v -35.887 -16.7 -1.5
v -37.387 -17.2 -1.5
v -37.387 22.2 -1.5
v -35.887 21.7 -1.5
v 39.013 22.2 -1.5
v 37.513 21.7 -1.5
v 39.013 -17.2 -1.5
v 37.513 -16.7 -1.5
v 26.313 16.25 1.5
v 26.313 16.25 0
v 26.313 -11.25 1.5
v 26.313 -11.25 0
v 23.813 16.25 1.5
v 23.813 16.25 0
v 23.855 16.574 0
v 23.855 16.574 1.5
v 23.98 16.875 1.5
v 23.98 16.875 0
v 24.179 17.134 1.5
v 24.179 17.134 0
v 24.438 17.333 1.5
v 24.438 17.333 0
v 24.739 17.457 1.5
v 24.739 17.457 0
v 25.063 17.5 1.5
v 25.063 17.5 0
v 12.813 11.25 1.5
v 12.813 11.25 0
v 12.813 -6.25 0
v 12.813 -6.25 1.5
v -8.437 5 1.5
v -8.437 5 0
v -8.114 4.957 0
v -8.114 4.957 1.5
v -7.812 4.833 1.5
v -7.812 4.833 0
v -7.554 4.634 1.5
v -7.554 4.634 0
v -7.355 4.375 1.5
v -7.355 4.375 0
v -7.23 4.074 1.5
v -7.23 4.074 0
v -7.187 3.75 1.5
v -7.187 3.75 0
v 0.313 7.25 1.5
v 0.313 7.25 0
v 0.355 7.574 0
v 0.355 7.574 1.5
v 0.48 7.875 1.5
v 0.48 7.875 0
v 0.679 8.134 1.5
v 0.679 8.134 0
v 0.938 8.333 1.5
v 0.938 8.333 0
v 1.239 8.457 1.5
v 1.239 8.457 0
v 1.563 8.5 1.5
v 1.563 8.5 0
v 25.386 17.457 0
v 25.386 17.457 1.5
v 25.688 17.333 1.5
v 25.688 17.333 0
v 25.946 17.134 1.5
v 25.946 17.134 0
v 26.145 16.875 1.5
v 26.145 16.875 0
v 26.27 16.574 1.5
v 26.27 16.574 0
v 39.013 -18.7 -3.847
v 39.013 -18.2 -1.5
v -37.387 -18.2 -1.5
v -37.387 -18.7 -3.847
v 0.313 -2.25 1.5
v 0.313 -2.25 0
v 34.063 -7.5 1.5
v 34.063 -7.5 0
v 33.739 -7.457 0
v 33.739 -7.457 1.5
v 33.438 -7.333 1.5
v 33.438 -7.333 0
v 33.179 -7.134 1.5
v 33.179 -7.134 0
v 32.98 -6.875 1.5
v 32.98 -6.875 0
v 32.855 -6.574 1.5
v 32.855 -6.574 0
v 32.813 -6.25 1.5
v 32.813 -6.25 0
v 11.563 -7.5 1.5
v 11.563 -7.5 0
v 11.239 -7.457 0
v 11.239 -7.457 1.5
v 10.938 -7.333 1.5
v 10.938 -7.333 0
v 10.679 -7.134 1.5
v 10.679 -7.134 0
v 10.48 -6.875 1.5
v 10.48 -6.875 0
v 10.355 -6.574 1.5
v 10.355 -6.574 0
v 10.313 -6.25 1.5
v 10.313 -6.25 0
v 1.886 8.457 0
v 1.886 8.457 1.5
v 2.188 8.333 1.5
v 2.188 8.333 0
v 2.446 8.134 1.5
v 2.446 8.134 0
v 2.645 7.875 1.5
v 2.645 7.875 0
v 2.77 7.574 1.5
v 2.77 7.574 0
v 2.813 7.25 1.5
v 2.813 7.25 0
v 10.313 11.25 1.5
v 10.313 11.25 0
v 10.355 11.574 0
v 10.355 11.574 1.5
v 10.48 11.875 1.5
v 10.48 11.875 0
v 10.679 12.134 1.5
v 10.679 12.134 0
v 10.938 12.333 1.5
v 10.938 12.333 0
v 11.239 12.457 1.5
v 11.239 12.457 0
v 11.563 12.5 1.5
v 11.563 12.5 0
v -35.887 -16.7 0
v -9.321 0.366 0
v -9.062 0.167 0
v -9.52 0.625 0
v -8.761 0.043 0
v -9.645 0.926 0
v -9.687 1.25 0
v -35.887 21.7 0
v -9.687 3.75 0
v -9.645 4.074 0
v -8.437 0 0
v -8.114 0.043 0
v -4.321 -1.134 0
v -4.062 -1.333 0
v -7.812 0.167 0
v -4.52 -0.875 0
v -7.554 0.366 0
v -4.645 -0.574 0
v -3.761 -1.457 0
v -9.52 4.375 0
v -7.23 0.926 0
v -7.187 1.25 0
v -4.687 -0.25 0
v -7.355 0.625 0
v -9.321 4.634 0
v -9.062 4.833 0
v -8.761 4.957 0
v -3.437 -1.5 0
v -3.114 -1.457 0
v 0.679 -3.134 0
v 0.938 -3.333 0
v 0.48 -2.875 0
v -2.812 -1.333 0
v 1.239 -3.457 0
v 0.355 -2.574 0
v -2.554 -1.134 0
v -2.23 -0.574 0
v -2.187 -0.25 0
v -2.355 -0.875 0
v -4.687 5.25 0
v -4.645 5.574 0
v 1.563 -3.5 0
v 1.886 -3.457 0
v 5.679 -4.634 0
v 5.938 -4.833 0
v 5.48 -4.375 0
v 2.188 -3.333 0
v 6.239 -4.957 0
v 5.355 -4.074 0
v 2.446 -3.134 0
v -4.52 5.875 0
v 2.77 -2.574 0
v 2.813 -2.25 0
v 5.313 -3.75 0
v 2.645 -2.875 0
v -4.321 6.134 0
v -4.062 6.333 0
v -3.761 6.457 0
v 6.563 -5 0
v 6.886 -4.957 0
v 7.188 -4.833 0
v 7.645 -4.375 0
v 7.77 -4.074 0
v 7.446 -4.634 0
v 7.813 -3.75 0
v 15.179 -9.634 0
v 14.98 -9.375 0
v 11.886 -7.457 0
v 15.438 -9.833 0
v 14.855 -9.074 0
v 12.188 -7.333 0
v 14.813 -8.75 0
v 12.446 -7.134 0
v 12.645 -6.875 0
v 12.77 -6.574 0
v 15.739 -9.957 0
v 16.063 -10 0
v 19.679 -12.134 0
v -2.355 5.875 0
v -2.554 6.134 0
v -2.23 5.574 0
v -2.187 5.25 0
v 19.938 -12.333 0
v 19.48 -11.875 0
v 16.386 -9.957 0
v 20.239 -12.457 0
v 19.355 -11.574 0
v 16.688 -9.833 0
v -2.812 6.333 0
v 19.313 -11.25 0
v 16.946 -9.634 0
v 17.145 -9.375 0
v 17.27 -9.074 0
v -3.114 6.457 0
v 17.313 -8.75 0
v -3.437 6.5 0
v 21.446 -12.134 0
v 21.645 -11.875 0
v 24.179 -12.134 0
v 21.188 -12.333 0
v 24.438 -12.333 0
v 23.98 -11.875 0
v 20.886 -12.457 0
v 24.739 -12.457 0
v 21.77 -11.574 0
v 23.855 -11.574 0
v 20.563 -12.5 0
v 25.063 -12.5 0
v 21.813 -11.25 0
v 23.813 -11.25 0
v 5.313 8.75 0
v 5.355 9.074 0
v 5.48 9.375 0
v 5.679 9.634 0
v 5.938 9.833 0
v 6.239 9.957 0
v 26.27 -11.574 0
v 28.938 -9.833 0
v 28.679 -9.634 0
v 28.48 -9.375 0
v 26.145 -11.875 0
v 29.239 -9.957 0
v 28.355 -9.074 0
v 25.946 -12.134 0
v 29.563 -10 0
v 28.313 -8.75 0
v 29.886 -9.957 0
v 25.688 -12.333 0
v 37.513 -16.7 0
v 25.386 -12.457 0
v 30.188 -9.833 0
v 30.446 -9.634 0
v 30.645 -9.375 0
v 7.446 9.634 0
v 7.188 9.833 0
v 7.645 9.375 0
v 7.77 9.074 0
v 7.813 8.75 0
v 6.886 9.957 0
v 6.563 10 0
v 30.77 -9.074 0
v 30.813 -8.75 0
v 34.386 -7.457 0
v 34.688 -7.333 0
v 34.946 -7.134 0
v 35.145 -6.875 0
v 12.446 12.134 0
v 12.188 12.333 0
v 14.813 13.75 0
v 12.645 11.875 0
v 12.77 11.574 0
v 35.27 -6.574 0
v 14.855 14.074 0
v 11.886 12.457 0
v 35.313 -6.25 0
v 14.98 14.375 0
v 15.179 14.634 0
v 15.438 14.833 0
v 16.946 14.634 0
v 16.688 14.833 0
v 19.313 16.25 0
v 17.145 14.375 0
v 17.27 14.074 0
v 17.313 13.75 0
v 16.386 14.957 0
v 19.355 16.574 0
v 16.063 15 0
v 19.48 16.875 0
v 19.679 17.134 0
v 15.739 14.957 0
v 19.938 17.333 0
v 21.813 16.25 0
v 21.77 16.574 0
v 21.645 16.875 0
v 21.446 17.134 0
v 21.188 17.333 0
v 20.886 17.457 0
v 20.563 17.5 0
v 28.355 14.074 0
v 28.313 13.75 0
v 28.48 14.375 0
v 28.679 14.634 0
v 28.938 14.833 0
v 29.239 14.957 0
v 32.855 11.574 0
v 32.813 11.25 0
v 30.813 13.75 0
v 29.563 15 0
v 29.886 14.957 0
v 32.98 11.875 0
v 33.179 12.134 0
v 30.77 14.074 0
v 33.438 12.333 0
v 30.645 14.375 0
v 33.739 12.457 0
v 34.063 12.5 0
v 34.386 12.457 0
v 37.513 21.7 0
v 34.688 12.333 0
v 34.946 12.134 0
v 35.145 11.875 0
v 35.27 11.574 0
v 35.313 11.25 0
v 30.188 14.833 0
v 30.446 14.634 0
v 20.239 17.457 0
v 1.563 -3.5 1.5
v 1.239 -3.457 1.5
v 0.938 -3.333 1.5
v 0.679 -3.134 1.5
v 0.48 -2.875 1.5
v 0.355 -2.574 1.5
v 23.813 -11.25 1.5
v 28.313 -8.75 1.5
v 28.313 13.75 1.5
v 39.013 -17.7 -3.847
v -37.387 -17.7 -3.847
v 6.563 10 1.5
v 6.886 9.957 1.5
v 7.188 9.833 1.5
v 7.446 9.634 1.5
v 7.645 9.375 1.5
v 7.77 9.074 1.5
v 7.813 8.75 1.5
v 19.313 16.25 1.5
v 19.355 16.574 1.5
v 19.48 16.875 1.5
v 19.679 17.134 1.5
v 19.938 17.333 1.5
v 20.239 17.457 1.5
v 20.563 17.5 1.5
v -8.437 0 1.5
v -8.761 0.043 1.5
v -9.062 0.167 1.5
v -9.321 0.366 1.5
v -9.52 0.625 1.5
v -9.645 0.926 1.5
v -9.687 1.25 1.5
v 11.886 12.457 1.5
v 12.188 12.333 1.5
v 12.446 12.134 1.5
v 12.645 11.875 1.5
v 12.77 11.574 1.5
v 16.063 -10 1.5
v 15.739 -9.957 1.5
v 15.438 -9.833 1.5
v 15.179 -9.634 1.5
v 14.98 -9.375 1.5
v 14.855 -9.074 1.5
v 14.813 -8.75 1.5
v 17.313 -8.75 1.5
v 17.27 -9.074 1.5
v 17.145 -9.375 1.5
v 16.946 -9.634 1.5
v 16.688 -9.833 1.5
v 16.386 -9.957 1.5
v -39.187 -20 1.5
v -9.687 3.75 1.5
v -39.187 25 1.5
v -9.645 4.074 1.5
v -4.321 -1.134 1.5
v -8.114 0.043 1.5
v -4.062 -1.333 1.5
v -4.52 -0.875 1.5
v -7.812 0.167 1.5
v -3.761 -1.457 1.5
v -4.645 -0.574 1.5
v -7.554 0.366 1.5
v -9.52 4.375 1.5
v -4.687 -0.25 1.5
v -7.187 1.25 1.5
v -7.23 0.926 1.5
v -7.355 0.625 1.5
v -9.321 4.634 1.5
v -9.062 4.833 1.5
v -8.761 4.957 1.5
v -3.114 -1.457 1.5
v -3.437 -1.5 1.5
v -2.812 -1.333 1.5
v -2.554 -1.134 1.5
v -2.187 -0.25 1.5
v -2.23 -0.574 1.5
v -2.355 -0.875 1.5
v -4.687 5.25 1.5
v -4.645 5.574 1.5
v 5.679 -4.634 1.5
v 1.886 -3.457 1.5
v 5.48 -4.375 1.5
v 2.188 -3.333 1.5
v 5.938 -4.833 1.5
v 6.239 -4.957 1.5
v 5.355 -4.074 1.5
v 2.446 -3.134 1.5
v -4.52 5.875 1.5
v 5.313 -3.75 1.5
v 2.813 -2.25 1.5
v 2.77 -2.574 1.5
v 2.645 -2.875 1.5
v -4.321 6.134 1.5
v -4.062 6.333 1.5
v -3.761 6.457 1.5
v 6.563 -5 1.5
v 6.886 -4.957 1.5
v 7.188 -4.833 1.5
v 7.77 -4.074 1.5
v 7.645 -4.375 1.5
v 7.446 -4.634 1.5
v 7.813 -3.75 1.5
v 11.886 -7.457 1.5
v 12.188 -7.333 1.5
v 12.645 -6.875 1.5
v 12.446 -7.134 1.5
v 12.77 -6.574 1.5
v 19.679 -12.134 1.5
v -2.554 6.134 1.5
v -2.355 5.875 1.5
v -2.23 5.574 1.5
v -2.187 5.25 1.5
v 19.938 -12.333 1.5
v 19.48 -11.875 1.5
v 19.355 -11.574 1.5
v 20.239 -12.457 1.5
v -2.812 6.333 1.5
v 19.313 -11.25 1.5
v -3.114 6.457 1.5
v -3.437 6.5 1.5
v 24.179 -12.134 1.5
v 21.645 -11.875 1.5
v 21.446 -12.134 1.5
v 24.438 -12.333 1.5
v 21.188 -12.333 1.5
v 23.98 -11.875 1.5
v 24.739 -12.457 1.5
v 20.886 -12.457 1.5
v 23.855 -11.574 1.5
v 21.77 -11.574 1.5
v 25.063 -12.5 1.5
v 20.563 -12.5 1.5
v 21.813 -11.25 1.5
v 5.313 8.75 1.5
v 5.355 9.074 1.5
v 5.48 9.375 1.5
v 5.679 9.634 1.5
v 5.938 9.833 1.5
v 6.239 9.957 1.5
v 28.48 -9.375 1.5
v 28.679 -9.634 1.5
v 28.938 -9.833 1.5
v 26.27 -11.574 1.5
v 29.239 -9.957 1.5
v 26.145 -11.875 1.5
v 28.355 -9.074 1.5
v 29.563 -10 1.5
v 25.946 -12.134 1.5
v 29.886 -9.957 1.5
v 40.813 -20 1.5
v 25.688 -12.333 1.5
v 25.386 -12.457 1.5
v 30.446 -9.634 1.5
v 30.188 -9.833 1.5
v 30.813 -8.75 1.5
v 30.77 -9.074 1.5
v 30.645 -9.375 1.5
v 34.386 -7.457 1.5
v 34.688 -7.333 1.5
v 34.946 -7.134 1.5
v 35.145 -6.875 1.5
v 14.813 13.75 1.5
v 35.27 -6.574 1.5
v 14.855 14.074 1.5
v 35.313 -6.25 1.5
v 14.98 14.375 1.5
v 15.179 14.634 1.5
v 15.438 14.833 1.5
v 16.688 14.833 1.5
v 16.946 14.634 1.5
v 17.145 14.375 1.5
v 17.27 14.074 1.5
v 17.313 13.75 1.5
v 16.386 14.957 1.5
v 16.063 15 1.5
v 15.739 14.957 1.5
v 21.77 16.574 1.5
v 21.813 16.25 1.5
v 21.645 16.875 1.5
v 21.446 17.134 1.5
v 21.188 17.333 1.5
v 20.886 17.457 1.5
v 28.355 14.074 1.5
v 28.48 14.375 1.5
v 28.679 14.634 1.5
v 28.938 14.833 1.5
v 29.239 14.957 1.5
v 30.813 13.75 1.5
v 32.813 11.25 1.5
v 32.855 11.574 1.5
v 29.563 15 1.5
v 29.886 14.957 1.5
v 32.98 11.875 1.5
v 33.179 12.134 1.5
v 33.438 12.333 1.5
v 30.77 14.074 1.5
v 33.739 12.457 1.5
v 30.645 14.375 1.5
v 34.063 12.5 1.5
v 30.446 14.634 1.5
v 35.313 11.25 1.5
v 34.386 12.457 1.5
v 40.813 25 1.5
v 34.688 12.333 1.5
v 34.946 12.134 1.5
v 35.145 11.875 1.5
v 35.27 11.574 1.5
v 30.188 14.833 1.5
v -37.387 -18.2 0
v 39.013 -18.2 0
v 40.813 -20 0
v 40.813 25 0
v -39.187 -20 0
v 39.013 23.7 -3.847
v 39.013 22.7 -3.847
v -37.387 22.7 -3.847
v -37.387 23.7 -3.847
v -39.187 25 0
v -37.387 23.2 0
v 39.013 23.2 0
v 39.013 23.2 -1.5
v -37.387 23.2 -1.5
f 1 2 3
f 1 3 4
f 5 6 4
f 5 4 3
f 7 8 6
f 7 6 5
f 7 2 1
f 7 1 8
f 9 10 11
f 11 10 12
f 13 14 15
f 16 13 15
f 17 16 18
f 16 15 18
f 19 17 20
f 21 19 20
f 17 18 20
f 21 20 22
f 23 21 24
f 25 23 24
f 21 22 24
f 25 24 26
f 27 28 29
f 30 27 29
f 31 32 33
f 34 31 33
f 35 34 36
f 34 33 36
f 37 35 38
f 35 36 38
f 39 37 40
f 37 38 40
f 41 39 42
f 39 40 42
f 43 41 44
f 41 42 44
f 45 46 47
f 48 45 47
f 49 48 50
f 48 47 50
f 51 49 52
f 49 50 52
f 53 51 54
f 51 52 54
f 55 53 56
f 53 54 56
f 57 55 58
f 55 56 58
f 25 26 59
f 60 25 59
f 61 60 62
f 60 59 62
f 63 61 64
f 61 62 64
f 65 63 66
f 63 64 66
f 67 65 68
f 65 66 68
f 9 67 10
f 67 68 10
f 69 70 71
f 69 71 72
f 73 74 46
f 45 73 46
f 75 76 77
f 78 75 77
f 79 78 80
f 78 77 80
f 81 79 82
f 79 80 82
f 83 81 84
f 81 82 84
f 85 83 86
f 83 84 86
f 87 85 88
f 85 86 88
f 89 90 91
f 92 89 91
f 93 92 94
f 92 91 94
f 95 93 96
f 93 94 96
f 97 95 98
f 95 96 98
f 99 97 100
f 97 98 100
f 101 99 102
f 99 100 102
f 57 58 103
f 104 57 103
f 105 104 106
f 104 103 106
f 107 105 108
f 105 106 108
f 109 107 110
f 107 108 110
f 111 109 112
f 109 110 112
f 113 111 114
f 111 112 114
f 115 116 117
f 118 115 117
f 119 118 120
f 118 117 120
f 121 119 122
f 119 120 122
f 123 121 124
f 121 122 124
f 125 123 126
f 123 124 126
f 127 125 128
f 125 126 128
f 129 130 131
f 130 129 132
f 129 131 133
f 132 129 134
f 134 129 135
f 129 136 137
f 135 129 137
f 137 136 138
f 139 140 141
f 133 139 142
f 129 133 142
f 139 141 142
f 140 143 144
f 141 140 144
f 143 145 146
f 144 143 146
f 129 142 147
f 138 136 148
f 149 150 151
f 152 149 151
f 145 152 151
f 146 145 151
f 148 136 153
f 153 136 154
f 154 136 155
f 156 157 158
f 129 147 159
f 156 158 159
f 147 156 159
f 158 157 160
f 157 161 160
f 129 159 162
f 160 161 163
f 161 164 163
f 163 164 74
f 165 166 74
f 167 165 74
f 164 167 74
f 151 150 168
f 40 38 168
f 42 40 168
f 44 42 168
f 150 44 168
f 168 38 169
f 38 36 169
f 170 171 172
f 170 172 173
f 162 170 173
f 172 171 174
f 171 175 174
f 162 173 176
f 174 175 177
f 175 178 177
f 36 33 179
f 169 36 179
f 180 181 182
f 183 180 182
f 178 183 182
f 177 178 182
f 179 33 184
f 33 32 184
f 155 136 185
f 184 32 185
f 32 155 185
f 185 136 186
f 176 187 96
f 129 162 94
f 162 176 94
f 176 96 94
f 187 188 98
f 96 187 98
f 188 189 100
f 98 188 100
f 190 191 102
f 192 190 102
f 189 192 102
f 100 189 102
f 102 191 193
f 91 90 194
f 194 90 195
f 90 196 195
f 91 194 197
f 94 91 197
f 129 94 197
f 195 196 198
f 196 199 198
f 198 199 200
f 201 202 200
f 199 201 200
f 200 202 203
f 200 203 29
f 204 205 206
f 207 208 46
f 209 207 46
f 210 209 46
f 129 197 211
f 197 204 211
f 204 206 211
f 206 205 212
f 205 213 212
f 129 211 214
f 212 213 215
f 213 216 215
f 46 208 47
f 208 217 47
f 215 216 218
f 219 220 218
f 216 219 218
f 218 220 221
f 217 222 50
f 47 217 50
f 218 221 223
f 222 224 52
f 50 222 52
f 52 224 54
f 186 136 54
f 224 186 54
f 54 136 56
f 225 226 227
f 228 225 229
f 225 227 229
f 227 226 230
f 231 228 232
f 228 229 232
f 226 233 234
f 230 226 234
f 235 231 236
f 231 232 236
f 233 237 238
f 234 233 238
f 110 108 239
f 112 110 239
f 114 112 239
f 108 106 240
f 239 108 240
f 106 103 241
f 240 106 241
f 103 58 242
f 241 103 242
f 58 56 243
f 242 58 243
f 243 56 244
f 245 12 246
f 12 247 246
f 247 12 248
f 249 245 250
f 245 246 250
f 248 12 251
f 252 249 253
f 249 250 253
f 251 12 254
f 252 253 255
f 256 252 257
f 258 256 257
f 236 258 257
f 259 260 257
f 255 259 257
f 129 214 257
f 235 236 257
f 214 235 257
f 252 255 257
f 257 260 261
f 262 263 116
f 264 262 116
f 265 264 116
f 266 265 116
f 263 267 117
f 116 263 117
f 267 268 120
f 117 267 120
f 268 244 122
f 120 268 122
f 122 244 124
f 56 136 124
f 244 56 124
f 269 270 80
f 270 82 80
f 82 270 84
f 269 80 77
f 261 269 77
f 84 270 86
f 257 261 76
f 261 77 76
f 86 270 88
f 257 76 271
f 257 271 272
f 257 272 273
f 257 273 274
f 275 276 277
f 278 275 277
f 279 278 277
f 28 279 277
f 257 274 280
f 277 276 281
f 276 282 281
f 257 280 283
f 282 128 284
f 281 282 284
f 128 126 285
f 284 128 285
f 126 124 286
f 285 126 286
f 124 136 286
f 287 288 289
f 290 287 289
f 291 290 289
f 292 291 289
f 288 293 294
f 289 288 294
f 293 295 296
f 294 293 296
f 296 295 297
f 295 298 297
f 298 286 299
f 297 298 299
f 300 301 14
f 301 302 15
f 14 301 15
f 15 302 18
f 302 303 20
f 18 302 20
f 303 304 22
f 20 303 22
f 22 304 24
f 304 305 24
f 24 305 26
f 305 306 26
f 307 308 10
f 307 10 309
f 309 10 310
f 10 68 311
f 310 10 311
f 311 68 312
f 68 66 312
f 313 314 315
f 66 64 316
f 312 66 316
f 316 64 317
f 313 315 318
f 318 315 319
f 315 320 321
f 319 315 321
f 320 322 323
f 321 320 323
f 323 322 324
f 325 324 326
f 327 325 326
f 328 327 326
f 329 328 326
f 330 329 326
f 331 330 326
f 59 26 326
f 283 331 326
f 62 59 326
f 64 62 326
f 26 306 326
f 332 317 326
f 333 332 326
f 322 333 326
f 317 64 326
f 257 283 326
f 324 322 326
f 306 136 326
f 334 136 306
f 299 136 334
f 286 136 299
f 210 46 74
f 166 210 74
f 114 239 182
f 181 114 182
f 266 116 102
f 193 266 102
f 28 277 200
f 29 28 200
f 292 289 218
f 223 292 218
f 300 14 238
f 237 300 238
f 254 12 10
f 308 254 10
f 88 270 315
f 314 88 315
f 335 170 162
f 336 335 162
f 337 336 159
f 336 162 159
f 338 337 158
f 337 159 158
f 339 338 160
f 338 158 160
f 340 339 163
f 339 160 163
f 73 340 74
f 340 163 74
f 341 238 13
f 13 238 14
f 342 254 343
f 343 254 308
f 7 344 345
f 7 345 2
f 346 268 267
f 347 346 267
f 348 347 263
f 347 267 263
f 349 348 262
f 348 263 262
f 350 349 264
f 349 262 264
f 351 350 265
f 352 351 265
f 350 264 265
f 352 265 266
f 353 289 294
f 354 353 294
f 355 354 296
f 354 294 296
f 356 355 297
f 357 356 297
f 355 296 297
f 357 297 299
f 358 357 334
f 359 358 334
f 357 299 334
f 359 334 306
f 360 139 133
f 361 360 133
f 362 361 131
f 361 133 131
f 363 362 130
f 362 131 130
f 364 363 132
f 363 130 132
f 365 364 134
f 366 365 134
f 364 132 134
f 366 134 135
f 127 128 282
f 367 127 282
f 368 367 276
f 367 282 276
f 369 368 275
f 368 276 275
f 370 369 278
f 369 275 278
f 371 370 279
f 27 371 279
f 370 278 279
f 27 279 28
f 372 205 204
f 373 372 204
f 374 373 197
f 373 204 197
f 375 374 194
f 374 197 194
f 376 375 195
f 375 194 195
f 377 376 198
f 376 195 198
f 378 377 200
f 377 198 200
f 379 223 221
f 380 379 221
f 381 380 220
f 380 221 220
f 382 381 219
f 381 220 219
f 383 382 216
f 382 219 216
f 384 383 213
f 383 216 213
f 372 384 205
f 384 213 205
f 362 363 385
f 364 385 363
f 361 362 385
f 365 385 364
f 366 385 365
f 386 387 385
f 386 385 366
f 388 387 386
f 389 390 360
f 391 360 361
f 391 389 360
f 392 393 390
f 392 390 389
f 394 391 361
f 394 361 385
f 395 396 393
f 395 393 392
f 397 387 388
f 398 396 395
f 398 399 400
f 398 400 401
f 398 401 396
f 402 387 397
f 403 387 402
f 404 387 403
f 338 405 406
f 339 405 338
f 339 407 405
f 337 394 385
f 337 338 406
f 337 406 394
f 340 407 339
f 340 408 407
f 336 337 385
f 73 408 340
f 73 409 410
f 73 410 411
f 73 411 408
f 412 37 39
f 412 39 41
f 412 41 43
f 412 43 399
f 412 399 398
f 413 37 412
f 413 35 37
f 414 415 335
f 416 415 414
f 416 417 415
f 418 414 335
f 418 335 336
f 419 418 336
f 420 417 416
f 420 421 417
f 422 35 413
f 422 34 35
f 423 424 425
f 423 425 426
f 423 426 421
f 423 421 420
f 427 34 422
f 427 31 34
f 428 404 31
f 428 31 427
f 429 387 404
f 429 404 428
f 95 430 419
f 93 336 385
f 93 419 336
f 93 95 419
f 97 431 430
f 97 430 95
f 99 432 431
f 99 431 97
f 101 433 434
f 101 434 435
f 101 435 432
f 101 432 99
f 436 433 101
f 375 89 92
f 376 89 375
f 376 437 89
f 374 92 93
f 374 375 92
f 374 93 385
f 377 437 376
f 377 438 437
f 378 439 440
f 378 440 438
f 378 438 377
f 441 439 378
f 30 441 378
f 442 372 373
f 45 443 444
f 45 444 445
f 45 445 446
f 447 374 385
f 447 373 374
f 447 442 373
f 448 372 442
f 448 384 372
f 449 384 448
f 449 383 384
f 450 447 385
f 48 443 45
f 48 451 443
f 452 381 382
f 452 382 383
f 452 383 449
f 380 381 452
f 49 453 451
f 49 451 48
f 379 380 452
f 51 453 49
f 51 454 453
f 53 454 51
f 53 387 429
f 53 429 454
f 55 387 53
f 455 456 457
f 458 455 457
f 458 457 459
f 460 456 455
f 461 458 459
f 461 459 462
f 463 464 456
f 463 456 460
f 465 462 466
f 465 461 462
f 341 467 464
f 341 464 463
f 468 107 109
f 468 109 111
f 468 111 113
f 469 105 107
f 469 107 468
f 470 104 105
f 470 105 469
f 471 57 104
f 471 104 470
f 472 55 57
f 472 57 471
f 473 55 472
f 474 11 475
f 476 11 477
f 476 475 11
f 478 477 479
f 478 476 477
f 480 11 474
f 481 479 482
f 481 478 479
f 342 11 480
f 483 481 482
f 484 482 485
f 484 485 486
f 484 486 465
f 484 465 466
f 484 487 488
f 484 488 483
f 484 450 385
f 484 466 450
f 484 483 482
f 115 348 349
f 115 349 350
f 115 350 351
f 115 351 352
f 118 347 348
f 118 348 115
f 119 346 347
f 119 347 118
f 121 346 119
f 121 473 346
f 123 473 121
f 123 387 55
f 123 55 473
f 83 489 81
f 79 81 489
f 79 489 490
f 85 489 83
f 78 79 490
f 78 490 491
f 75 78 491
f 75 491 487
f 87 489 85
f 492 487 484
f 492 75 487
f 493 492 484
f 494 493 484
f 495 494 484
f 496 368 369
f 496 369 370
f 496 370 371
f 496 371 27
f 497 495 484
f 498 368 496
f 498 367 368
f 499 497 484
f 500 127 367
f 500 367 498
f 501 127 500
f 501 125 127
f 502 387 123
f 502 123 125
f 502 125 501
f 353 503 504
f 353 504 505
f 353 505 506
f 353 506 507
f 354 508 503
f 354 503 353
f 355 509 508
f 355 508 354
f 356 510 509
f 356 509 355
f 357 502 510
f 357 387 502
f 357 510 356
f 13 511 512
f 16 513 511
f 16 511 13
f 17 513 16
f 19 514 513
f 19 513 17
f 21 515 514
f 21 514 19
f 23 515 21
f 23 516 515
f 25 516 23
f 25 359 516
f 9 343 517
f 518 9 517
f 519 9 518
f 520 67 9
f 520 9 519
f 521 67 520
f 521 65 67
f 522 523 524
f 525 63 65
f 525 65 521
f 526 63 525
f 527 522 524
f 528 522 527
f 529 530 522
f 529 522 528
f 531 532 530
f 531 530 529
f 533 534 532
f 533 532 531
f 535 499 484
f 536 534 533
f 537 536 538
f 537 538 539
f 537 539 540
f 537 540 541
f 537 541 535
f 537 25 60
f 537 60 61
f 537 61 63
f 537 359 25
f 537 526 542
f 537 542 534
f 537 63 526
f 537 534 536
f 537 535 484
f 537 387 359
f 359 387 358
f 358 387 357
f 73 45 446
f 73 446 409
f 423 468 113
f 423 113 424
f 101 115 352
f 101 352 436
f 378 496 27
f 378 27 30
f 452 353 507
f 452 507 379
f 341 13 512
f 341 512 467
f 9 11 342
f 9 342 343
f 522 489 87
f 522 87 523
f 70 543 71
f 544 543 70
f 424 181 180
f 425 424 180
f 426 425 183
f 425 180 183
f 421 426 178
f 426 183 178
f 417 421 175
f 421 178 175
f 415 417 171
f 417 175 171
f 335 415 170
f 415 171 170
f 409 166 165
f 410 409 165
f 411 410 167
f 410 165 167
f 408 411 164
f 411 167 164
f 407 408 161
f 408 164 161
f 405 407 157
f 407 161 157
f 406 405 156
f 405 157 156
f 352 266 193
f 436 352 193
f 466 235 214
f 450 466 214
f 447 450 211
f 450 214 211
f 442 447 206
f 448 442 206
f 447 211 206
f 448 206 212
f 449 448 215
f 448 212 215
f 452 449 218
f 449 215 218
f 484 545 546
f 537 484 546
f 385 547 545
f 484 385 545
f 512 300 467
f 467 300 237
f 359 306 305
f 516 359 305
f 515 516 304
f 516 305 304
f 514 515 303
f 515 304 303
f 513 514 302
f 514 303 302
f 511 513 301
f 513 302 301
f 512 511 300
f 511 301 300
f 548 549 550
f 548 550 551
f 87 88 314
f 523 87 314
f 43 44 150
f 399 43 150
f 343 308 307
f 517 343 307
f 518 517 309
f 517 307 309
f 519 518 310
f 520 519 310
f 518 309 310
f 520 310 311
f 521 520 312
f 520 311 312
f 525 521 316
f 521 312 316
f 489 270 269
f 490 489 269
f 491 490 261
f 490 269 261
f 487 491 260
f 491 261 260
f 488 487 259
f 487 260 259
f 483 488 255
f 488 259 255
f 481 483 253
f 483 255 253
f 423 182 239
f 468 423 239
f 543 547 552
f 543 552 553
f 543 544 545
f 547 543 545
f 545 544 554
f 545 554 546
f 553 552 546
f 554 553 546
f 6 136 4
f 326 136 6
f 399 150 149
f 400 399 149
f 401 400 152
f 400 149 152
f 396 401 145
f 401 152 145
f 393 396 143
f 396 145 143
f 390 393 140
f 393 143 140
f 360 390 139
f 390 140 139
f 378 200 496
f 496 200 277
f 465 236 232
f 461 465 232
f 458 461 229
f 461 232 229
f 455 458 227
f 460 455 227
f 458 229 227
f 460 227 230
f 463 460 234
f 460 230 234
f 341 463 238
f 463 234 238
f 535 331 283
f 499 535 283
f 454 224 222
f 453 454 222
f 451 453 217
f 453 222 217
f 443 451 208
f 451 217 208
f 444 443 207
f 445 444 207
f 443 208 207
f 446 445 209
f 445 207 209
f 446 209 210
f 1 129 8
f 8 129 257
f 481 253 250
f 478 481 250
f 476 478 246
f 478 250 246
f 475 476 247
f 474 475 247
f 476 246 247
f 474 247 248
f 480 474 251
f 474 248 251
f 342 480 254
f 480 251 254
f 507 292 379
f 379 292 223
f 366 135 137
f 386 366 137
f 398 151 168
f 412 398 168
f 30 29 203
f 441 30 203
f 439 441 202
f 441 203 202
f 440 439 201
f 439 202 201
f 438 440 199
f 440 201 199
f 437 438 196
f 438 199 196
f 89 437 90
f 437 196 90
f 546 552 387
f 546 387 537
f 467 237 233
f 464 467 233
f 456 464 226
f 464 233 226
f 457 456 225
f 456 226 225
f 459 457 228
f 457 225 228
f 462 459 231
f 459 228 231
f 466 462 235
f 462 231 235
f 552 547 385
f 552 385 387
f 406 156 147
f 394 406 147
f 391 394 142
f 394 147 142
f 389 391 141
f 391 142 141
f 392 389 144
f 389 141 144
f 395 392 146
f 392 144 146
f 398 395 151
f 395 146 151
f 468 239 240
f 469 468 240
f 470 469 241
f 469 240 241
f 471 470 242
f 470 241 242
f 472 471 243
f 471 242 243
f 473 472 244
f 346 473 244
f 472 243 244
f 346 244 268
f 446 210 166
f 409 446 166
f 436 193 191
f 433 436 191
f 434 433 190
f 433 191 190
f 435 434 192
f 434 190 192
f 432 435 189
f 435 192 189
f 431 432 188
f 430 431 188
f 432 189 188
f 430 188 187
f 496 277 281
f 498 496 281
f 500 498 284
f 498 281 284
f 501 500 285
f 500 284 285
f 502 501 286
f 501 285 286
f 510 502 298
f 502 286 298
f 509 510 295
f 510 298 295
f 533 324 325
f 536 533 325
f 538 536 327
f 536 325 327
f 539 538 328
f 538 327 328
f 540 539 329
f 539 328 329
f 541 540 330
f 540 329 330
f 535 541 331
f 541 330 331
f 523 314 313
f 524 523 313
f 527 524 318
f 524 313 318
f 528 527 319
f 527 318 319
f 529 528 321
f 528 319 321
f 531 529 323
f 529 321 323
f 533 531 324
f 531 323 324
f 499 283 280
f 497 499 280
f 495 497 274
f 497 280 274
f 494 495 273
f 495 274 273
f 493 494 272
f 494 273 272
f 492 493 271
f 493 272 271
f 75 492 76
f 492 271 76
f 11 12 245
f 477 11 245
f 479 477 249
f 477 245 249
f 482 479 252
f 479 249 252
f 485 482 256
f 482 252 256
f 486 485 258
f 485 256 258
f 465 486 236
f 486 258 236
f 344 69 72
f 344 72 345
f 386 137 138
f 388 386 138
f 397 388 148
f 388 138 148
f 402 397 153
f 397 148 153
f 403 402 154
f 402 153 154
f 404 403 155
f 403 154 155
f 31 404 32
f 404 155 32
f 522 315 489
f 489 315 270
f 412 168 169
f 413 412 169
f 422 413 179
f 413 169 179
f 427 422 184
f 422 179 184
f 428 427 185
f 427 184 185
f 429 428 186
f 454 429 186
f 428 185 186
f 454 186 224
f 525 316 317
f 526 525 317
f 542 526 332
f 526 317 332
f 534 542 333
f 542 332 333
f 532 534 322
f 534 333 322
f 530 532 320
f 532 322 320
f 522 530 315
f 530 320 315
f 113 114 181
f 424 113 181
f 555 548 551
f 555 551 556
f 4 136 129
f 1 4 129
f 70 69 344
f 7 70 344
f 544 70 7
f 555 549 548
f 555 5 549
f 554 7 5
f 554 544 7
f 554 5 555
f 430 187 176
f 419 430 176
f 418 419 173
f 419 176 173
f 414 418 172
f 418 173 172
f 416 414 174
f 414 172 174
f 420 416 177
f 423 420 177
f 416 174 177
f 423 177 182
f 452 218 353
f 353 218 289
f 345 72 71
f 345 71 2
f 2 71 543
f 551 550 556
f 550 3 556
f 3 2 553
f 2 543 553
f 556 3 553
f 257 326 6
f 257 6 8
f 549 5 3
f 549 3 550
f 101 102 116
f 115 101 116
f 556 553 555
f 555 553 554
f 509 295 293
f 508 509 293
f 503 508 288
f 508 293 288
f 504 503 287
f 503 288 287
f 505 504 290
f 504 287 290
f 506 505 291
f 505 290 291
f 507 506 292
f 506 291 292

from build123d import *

# Parameters (mm, degrees)
F0_W     = 80
F0_H     = 45
F1_DEPTH = 1.5
F2_W     = 76.4
F2_H     = 41.4
F2_W_2   = 73.4
F2_H_2   = 38.4
F3_DEPTH = 1.5
F5_DEPTH = 76.4
F6_DEPTH = 76.4


with BuildPart() as f1:
    # F0 (on Top) → F1 (new body)
    with BuildSketch(Plane.XY):
        with Locations((0.812615, 2.5)):
            Rectangle(F0_W, F0_H)
        with BuildLine():
            ThreePointArc((-8.437385, 0), (-9.321268, 0.366117), (-9.687385, 1.25))
            Line((-9.687385, 1.25), (-9.687385, 3.75))
            ThreePointArc((-9.687385, 3.75), (-9.321268, 4.633883), (-8.437385, 5))
            ThreePointArc((-8.437385, 5), (-7.553501, 4.633883), (-7.187385, 3.75))
            Line((-7.187385, 3.75), (-7.187385, 1.25))
            ThreePointArc((-7.187385, 1.25), (-7.553501, 0.366117), (-8.437385, 0))
        make_face(mode=Mode.SUBTRACT)
        with BuildLine():
            ThreePointArc((-3.437385, -1.5), (-4.321268, -1.133883), (-4.687385, -0.25))
            Line((-4.687385, -0.25), (-4.687385, 5.25))
            ThreePointArc((-4.687385, 5.25), (-4.321268, 6.133883), (-3.437385, 6.5))
            ThreePointArc((-3.437385, 6.5), (-2.553501, 6.133883), (-2.187385, 5.25))
            Line((-2.187385, 5.25), (-2.187385, -0.25))
            ThreePointArc((-2.187385, -0.25), (-2.553501, -1.133883), (-3.437385, -1.5))
        make_face(mode=Mode.SUBTRACT)
        with BuildLine():
            ThreePointArc((1.562615, -3.5), (0.678732, -3.133883), (0.312615, -2.25))
            Line((0.312615, -2.25), (0.312615, 7.25))
            ThreePointArc((0.312615, 7.25), (0.678732, 8.133883), (1.562615, 8.5))
            ThreePointArc((1.562615, 8.5), (2.446499, 8.133883), (2.812615, 7.25))
            Line((2.812615, 7.25), (2.812615, -2.25))
            ThreePointArc((2.812615, -2.25), (2.446499, -3.133883), (1.562615, -3.5))
        make_face(mode=Mode.SUBTRACT)
        with BuildLine():
            ThreePointArc((6.562615, -5), (5.678732, -4.633883), (5.312615, -3.75))
            Line((5.312615, -3.75), (5.312615, 8.75))
            ThreePointArc((5.312615, 8.75), (5.678732, 9.633883), (6.562615, 10))
            ThreePointArc((6.562615, 10), (7.446499, 9.633883), (7.812615, 8.75))
            Line((7.812615, 8.75), (7.812615, -3.75))
            ThreePointArc((7.812615, -3.75), (7.446499, -4.633883), (6.562615, -5))
        make_face(mode=Mode.SUBTRACT)
        with BuildLine():
            Line((10.312615, -6.25), (10.312615, 11.25))
            ThreePointArc((10.312615, 11.25), (10.678732, 12.133883), (11.562615, 12.5))
            ThreePointArc((11.562615, 12.5), (12.446499, 12.133883), (12.812615, 11.25))
            Line((12.812615, 11.25), (12.812615, -6.25))
            ThreePointArc((12.812615, -6.25), (12.446499, -7.133883), (11.562615, -7.5))
            ThreePointArc((11.562615, -7.5), (10.678732, -7.133883), (10.312615, -6.25))
        make_face(mode=Mode.SUBTRACT)
        with BuildLine():
            Line((14.812615, -8.75), (14.812615, 13.75))
            ThreePointArc((14.812615, 13.75), (15.178732, 14.633883), (16.062615, 15))
            ThreePointArc((16.062615, 15), (16.946499, 14.633883), (17.312615, 13.75))
            Line((17.312615, 13.75), (17.312615, -8.75))
            ThreePointArc((17.312615, -8.75), (16.946499, -9.633883), (16.062615, -10))
            ThreePointArc((16.062615, -10), (15.178732, -9.633883), (14.812615, -8.75))
        make_face(mode=Mode.SUBTRACT)
        with BuildLine():
            Line((19.312615, -11.25), (19.312615, 16.25))
            ThreePointArc((19.312615, 16.25), (19.678732, 17.133883), (20.562615, 17.5))
            ThreePointArc((20.562615, 17.5), (21.446499, 17.133883), (21.812615, 16.25))
            Line((21.812615, 16.25), (21.812615, -11.25))
            ThreePointArc((21.812615, -11.25), (21.446499, -12.133883), (20.562615, -12.5))
            ThreePointArc((20.562615, -12.5), (19.678732, -12.133883), (19.312615, -11.25))
        make_face(mode=Mode.SUBTRACT)
        with BuildLine():
            Line((23.812615, -11.25), (23.812615, 16.25))
            ThreePointArc((23.812615, 16.25), (24.178732, 17.133883), (25.062615, 17.5))
            ThreePointArc((25.062615, 17.5), (25.946499, 17.133883), (26.312615, 16.25))
            Line((26.312615, 16.25), (26.312615, -11.25))
            ThreePointArc((26.312615, -11.25), (25.946499, -12.133883), (25.062615, -12.5))
            ThreePointArc((25.062615, -12.5), (24.178732, -12.133883), (23.812615, -11.25))
        make_face(mode=Mode.SUBTRACT)
        with BuildLine():
            Line((28.312615, -8.75), (28.312615, 13.75))
            ThreePointArc((28.312615, 13.75), (28.678732, 14.633883), (29.562615, 15))
            ThreePointArc((29.562615, 15), (30.446499, 14.633883), (30.812615, 13.75))
            Line((30.812615, 13.75), (30.812615, -8.75))
            ThreePointArc((30.812615, -8.75), (30.446499, -9.633883), (29.562615, -10))
            ThreePointArc((29.562615, -10), (28.678732, -9.633883), (28.312615, -8.75))
        make_face(mode=Mode.SUBTRACT)
        with BuildLine():
            Line((32.812615, -6.25), (32.812615, 11.25))
            ThreePointArc((32.812615, 11.25), (33.178732, 12.133883), (34.062615, 12.5))
            ThreePointArc((34.062615, 12.5), (34.946499, 12.133883), (35.312615, 11.25))
            Line((35.312615, 11.25), (35.312615, -6.25))
            ThreePointArc((35.312615, -6.25), (34.946499, -7.133883), (34.062615, -7.5))
            ThreePointArc((34.062615, -7.5), (33.178732, -7.133883), (32.812615, -6.25))
        make_face(mode=Mode.SUBTRACT)
    extrude(amount=F1_DEPTH)

    # F2 (on face) → F3 (join)
    with BuildSketch(Plane(origin=(0, 0, 0), x_dir=(1, 0, 0), z_dir=(0, 0, -1))):
        with Locations((0.812615, -2.5)):
            Rectangle(F2_W, F2_H)
        with Locations((0.812615, -2.5)):
            Rectangle(F2_W_2, F2_H_2, mode=Mode.SUBTRACT)
    extrude(amount=F3_DEPTH)

    # F4 (on face) → F5 (join)
    with BuildSketch(Plane.YZ.offset(39.012615)):
        Polygon((23.7, -3.847339), (23.2, -1.5), (22.2, -1.5), (22.7, -3.847339), align=None)
    extrude(amount=-F5_DEPTH)

    # F4 (on face) → F6 (join)
    with BuildSketch(Plane.YZ.offset(39.012615)):
        Polygon((23.7, -3.847339), (23.2, -1.5), (22.2, -1.5), (22.7, -3.847339), align=None)
        Polygon((-18.7, -3.847339), (-17.7, -3.847339), (-17.2, -1.5), (-18.2, -1.5), align=None)
    extrude(amount=-F6_DEPTH)


solid = f1.part
